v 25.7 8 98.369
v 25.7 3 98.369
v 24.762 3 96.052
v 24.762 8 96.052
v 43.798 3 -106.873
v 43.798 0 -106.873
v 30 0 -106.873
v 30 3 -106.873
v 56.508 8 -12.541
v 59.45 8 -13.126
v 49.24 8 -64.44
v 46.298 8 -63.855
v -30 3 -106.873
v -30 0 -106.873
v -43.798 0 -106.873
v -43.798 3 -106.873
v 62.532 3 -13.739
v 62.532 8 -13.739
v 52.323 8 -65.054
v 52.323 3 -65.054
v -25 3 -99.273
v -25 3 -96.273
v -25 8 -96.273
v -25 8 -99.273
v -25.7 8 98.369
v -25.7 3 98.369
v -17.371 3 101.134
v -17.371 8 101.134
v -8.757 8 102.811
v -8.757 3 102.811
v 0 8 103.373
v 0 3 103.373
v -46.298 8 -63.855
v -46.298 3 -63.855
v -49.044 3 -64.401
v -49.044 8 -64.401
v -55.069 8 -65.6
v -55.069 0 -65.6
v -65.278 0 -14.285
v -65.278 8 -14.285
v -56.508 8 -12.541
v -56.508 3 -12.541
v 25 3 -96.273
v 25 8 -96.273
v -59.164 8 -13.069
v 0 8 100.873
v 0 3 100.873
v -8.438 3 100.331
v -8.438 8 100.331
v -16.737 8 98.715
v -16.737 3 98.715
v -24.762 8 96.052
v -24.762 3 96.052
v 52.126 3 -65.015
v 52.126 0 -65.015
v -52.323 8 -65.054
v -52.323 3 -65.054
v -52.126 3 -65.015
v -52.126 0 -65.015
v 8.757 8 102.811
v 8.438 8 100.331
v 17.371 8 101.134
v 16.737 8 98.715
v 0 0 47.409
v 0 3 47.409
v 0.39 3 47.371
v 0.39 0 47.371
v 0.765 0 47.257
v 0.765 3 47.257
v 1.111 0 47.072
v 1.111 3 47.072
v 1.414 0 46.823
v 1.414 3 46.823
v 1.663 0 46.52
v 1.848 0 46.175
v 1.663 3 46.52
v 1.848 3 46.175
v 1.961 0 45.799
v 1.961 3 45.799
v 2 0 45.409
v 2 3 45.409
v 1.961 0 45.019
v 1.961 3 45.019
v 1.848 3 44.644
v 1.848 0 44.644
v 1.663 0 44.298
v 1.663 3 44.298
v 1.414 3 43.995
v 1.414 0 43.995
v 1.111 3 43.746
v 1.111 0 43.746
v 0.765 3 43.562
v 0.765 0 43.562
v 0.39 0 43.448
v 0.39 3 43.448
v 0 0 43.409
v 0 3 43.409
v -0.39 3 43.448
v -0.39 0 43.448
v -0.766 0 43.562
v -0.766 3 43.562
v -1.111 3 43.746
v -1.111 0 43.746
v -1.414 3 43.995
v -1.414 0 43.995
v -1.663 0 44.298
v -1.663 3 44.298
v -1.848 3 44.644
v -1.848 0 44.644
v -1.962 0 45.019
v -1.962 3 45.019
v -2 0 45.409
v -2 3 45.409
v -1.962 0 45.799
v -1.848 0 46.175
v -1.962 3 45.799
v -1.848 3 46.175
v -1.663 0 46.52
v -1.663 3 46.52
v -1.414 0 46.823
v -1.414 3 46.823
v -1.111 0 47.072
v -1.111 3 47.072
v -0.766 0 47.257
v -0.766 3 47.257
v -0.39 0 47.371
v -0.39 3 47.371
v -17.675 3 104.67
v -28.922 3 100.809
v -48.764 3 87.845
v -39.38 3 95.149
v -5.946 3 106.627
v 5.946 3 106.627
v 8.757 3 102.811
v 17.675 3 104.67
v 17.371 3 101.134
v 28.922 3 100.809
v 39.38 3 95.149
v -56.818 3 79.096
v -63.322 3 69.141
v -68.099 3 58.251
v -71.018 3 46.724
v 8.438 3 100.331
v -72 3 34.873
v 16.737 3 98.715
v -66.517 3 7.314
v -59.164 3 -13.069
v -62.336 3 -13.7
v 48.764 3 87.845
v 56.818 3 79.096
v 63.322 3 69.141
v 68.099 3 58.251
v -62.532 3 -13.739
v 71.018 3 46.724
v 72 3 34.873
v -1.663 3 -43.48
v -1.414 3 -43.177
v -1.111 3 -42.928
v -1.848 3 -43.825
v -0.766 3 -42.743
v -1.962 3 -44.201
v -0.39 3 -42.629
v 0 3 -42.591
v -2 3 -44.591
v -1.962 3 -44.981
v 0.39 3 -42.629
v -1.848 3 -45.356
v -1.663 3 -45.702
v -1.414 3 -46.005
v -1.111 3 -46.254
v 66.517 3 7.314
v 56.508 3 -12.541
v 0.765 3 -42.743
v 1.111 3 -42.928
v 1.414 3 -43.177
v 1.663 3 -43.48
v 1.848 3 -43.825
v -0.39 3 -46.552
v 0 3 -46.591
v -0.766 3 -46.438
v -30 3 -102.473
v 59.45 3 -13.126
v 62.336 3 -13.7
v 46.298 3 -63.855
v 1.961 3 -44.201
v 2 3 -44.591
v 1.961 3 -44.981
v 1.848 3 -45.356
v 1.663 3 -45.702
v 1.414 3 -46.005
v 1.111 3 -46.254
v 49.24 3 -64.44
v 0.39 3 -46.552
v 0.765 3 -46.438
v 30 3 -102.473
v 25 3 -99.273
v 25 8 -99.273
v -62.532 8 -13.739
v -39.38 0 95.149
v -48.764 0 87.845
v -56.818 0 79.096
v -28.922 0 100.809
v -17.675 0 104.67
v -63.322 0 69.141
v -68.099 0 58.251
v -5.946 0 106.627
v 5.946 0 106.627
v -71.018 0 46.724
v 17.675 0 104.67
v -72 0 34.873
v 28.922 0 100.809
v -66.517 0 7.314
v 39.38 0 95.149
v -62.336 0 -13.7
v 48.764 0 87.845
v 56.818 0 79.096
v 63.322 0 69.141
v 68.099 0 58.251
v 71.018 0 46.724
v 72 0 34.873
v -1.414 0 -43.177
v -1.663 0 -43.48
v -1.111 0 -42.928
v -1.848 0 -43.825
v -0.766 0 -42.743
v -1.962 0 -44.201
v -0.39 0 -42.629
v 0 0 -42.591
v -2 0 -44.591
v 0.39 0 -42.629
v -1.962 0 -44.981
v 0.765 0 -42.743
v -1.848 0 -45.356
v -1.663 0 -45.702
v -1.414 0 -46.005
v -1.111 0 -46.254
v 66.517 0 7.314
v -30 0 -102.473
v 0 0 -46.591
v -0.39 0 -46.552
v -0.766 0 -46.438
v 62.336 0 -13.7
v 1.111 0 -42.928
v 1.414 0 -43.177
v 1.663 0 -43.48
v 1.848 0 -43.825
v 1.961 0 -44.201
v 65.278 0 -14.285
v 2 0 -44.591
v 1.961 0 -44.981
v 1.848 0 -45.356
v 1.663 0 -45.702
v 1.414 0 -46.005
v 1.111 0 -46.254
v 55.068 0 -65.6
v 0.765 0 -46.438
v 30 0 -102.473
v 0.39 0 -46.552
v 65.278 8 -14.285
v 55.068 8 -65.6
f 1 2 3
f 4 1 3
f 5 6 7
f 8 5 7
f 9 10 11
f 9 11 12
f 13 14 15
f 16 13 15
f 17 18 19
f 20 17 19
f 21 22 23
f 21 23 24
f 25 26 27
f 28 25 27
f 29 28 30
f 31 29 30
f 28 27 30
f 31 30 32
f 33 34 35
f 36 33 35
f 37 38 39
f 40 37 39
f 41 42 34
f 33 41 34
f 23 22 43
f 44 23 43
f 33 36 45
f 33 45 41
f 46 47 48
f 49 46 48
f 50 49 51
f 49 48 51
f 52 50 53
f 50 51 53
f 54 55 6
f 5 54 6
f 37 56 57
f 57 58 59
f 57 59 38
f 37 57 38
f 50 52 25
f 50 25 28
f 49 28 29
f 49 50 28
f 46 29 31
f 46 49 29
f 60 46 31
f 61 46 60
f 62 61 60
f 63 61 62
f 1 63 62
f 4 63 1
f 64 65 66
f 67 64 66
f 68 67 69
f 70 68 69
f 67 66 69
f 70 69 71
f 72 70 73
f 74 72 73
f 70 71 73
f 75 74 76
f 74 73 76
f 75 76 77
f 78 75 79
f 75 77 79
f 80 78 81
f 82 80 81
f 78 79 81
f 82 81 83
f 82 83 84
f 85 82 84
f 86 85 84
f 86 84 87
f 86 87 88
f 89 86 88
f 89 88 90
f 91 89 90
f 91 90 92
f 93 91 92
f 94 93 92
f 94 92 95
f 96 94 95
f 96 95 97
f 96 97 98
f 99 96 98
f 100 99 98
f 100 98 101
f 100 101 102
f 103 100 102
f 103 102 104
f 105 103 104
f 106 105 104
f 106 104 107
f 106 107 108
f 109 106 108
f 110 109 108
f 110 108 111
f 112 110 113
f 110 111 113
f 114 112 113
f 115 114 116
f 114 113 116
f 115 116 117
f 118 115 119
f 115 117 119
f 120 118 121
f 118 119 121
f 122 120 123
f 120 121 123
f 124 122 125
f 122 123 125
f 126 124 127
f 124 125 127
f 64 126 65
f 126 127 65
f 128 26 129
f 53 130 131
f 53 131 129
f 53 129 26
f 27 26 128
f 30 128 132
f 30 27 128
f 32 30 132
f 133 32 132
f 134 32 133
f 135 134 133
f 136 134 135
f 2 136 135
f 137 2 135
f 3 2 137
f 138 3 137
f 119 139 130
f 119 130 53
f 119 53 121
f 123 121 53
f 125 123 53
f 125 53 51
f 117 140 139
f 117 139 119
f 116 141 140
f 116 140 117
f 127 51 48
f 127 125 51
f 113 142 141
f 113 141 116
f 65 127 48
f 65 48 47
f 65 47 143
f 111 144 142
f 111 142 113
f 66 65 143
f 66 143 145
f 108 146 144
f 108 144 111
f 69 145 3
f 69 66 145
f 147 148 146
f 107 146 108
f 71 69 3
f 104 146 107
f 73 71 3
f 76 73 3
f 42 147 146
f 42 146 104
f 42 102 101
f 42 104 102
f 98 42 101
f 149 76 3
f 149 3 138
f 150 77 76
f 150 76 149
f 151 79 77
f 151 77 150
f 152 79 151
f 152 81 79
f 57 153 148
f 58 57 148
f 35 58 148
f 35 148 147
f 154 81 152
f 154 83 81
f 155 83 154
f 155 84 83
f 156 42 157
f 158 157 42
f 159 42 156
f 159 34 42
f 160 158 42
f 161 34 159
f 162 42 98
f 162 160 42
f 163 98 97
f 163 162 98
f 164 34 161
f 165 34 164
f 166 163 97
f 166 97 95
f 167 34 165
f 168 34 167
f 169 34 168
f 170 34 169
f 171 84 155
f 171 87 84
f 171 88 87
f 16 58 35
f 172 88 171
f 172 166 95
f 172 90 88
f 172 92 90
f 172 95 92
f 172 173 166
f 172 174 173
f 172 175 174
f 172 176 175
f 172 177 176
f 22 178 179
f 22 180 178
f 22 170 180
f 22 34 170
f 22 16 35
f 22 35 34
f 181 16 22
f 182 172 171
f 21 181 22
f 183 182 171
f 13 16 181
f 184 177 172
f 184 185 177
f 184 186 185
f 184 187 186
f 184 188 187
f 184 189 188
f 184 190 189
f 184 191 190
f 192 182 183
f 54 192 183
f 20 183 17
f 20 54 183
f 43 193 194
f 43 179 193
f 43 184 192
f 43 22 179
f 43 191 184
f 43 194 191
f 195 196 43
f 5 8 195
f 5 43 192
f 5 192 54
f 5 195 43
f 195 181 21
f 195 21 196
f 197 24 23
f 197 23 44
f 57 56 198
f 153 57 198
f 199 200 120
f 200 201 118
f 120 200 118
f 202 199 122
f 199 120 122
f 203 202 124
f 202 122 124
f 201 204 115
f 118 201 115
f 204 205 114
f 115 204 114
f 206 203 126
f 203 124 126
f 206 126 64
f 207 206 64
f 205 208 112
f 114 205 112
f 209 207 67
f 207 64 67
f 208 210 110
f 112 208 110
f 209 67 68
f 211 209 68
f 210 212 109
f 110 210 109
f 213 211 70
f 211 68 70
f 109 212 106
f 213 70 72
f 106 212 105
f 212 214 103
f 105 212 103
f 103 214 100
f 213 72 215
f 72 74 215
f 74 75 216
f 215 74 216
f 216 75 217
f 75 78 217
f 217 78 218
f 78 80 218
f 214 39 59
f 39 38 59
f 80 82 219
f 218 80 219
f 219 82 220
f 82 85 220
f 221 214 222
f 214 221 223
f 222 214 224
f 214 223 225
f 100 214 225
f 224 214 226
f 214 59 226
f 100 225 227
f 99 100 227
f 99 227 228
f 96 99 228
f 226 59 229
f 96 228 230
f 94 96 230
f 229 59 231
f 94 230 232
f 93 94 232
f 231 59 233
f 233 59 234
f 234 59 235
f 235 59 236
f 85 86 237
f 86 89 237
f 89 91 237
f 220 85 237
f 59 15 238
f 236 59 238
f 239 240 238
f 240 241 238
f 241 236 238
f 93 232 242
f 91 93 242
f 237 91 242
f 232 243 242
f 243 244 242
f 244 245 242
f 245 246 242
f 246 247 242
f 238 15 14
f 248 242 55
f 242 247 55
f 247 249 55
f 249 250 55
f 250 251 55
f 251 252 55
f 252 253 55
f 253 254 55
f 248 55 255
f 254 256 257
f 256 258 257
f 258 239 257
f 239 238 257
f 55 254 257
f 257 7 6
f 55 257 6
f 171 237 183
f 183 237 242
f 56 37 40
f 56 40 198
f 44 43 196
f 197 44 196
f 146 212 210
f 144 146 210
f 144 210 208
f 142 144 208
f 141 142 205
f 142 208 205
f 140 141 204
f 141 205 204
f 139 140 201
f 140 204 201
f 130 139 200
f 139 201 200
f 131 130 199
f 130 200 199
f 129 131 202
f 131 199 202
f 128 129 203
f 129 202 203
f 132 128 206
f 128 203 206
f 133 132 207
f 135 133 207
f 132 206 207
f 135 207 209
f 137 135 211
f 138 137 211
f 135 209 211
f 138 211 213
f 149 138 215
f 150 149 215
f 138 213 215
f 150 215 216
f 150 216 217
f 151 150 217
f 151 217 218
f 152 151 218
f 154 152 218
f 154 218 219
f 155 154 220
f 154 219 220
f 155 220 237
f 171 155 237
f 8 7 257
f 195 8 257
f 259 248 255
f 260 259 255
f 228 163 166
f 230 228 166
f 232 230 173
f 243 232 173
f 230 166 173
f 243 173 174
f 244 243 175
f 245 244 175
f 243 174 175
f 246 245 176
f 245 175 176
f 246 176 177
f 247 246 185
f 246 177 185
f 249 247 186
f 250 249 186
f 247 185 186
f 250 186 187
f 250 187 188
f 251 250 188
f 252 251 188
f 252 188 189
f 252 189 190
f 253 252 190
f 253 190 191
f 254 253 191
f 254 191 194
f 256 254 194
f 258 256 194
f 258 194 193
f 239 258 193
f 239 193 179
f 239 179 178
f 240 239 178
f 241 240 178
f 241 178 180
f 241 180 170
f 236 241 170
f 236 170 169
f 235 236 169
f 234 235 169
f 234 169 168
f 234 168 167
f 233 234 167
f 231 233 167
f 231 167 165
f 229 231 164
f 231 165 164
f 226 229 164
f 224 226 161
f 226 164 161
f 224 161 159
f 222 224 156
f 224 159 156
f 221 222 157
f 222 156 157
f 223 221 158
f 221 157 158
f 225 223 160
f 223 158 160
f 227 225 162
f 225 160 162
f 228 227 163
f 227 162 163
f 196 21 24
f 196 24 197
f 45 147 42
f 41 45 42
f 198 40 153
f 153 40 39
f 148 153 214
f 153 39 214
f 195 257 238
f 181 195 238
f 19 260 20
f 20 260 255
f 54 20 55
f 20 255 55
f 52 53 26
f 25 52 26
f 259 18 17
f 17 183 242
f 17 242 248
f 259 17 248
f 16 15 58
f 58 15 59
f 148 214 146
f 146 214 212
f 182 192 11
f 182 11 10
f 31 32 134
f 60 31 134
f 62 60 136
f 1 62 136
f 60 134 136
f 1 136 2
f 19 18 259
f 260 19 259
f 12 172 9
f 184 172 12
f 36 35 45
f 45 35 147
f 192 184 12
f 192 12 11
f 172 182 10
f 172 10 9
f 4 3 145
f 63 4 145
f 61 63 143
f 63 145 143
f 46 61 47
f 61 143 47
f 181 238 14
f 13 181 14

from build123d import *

# Parameters (mm, degrees)
SALIENTE_EXTRUIR1_DEPTH      = 3
SALIENTE_EXTRUIR3_DEPTH      = 5
CROQUIS5_W                   = 50
CROQUIS5_H                   = 3
SALIENTE_EXTRUIR4_DEPTH      = 5
SALIENTE_EXTRUIR6_DEPTH      = 5
SALIENTE_EXTRUIR7_DEPTH      = 5
SALIENTE_EXTRUIR7_DEPTH_BACK = 3
CORTAR_EXTRUIR2_DEPTH        = 5
CROQUIS11_R                  = 2
CORTAR_EXTRUIR3_DEPTH        = 5


with BuildPart() as part:
    # Croquis2 → Saliente-Extruir1 (new body)
    with BuildSketch(Plane(origin=(0, 0, 0), x_dir=(1, 0, 0), z_dir=(0, 1, 0))):
        with BuildLine():
            Line((-66.516806956, -7.313551242), (-72, -34.872839919))
            ThreePointArc((-72, -34.872839919), (0, -106.872839919), (72, -34.872839919))
            Line((72, -34.872839919), (66.516806956, -7.313551242))
            ThreePointArc((66.516806956, -7.313551242), (0, 37.127160081), (-66.516806956, -7.313551242))
        make_face()
        with BuildLine():
            Line((-43.798295131, 106.872839919), (-66.516806956, -7.313551242))
            ThreePointArc((-66.516806956, -7.313551242), (0, 37.127160081), (66.516806956, -7.313551242))
            Line((66.516806956, -7.313551242), (43.798295131, 106.872839919))
            Line((43.798295131, 106.872839919), (30, 106.872839919))
            Line((30, 106.872839919), (30, 102.472839919))
            Line((30, 102.472839919), (-30, 102.472839919))
            Line((-30, 102.472839919), (-30, 106.872839919))
            Line((-30, 106.872839919), (-43.798295131, 106.872839919))
        make_face()
    extrude(amount=SALIENTE_EXTRUIR1_DEPTH)

    # Croquis3 → Saliente-Extruir3 (add)
    with BuildSketch(Plane(origin=(0, 3, 0), x_dir=(1, 0, 0), z_dir=(0, 1, 0))):
        with BuildLine():
            Line((0, -100.872839919), (0, -103.372839919))
            ThreePointArc((0, -103.372839919), (13.091100059, -102.110278145), (25.699621359, -98.369134787))
            Line((25.699621359, -98.369134787), (24.761678974, -96.051751763))
            ThreePointArc((24.761678974, -96.051751763), (12.613322685, -99.656357042), (0, -100.872839919))
        make_face()
        with BuildLine():
            ThreePointArc((-25.699621359, -98.369134787), (-13.091100059, -102.110278145), (0, -103.372839919))
            Line((0, -103.372839919), (0, -100.872839919))
            ThreePointArc((0, -100.872839919), (-12.613322685, -99.656357042), (-24.761678974, -96.051751763))
            Line((-24.761678974, -96.051751763), (-25.699621359, -98.369134787))
        make_face()
    extrude(amount=SALIENTE_EXTRUIR3_DEPTH)

    # Croquis5 → Saliente-Extruir4 (add)
    with BuildSketch(Plane(origin=(0, 3, 0), x_dir=(1, 0, 0), z_dir=(0, 1, 0))):
        with Locations((0, 97.772839919)):
            Rectangle(CROQUIS5_W, CROQUIS5_H)
    extrude(amount=SALIENTE_EXTRUIR4_DEPTH)

    # Croquis6 → Saliente-Extruir6 (add)
    with BuildSketch(Plane(origin=(0, 3, 0), x_dir=(1, 0, 0), z_dir=(0, 1, 0))):
        Polygon((-46.298308612, 63.855049889), (-49.044482423, 64.401428328), (-59.164112379, 13.069022297), (-56.507839729, 12.540530583), align=None)
        Polygon((56.507539535, 12.540530583), (46.298008419, 63.855049889), (49.240337502, 64.440455359), (59.449868619, 13.125936053), align=None)
    extrude(amount=SALIENTE_EXTRUIR6_DEPTH)

    # Croquis8 → Saliente-Extruir7 (add, two sides: drawn at the far end of the back side and taken through both)
    with BuildSketch(Plane(origin=(0, 3, 0), x_dir=(1, 0, 0), z_dir=(0, 1, 0)).offset(-SALIENTE_EXTRUIR7_DEPTH_BACK)):
        Polygon((-65.278264707, 14.285493372), (-62.335935624, 13.700087901), (-52.126404507, 65.014607207), (-55.06873359, 65.600012678), align=None)
        Polygon((52.126393076, 65.014664659), (62.335924193, 13.700145353), (65.277964514, 14.285493372), (55.068433397, 65.600012678), align=None)
    extrude(amount=SALIENTE_EXTRUIR7_DEPTH + SALIENTE_EXTRUIR7_DEPTH_BACK)

    # Croquis9 → Cortar-Extruir2 (cut)
    with BuildSketch(Plane(origin=(0, 8, 0), x_dir=(1, 0, 0), z_dir=(0, 1, 0))):
        Polygon((62.335924193, 13.700145353), (62.532079465, 13.739172384), (52.322548348, 65.05369169), (52.126393076, 65.014664659), align=None)
        Polygon((-62.532090896, 13.739114932), (-62.335935624, 13.700087901), (-52.126404507, 65.014607207), (-52.322559779, 65.053634238), align=None)
    extrude(amount=-CORTAR_EXTRUIR2_DEPTH, mode=Mode.SUBTRACT)

    # Croquis11 → Cortar-Extruir3 (cut)
    with BuildSketch(Plane(origin=(0, 3, 0), x_dir=(1, 0, 0), z_dir=(0, 1, 0))):
        with Locations(Location((-0.000150097, 44.590728717, 0), (0, 0, 270))):
            Circle(CROQUIS11_R)
        with Locations(Location((-0.000150097, -45.409271283, 0), (0, 0, 270))):
            Circle(CROQUIS11_R)
    extrude(amount=-CORTAR_EXTRUIR3_DEPTH, mode=Mode.SUBTRACT)


solid = part.part
